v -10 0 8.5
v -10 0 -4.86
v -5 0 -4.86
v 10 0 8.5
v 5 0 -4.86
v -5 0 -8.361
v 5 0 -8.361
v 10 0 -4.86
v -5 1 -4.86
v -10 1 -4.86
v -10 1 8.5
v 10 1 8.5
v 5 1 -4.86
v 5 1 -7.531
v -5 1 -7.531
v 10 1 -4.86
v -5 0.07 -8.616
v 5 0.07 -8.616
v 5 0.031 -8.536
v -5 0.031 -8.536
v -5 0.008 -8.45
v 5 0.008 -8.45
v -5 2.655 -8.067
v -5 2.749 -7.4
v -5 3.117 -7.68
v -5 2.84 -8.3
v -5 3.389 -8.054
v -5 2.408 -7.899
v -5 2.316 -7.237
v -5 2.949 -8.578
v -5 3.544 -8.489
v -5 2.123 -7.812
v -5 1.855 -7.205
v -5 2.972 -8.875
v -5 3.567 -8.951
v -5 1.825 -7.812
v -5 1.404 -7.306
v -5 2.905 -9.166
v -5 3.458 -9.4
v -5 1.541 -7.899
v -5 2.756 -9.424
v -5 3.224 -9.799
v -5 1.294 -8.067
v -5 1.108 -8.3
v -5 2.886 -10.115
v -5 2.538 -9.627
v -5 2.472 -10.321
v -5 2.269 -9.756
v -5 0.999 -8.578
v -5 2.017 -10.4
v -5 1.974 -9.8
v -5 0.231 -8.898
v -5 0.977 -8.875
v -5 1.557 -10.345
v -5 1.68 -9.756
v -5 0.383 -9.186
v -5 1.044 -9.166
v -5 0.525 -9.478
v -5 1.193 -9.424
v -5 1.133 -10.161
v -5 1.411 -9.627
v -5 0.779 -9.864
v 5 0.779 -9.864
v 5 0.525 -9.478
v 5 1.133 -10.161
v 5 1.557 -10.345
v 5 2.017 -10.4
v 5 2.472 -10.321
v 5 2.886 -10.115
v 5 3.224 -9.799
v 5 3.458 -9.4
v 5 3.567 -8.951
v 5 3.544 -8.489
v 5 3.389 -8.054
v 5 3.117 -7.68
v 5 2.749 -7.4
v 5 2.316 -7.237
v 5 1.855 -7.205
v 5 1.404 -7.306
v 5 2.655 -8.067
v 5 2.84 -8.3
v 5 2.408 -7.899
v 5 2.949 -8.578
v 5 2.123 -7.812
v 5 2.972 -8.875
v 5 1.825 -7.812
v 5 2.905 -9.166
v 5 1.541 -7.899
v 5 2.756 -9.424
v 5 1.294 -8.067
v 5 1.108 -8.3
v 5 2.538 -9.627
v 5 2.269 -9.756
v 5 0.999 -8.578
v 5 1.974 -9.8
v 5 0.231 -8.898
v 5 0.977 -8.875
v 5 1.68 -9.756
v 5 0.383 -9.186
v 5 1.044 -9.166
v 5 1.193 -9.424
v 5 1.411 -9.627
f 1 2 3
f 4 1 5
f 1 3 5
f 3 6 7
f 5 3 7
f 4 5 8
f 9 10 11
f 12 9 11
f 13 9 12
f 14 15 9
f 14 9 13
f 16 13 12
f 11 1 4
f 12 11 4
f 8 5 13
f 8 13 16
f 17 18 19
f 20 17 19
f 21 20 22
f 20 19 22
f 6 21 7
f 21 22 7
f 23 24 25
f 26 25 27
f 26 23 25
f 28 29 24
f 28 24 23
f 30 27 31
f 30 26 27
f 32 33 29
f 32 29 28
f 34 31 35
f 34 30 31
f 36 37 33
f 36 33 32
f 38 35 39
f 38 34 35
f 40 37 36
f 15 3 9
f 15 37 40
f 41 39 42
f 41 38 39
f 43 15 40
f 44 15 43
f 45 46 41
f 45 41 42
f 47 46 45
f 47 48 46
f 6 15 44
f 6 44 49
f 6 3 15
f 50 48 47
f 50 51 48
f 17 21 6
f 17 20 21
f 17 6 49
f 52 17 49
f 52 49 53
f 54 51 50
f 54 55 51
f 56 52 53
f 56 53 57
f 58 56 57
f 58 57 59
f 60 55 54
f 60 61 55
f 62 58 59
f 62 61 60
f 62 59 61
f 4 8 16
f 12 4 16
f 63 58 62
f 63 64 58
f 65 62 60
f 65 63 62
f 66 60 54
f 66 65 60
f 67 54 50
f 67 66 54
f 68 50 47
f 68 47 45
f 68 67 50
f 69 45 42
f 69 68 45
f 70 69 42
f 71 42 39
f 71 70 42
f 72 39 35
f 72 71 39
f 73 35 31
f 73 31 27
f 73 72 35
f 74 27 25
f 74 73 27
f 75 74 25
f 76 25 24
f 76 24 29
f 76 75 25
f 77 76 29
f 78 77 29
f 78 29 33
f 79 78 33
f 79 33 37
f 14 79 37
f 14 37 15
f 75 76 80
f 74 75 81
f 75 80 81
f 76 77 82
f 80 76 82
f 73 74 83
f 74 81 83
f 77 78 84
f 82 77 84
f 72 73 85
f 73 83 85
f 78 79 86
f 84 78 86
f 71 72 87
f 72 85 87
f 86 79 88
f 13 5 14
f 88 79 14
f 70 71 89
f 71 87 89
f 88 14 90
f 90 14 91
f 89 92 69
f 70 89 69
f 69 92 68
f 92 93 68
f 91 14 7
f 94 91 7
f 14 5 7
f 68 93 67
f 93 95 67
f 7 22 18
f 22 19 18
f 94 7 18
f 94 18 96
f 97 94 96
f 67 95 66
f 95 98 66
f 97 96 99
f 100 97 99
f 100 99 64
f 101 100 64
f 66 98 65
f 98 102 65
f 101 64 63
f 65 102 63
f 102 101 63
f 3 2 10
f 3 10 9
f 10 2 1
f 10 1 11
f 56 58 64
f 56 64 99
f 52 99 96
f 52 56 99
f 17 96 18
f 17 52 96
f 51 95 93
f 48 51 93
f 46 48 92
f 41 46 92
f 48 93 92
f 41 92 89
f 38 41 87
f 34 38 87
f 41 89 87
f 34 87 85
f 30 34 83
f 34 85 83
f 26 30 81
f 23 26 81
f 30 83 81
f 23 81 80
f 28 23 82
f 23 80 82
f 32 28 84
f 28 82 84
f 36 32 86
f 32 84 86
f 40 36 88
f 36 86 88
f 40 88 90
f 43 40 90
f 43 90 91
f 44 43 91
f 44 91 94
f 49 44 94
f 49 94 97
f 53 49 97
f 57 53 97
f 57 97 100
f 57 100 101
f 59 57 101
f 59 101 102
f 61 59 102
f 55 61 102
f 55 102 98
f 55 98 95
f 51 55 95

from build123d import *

# Parameters (mm, degrees)
SKETCH1_W           = 20
SKETCH1_H           = 17
BOSS_EXTRUDE1_DEPTH = 1
SKETCH2_R           = 1.6
SKETCH2_R_2         = 1
BOSS_EXTRUDE2_DEPTH = 20
FILLET1_R           = 10
FILLET2_R           = 0.5
SKETCH4_W           = 10
SKETCH4_H           = 12
CUT_EXTRUDE3_DEPTH  = 15.86420015


with BuildPart() as part:
    # Sketch1 → Boss-Extrude1 (new body)
    with BuildSketch(Plane(origin=(0, 0, 0), x_dir=(1, 0, 0), z_dir=(0, 1, 0))):
        Rectangle(SKETCH1_W, SKETCH1_H)
    extrude(amount=BOSS_EXTRUDE1_DEPTH)

    # Sketch2 → Boss-Extrude2 (add)
    with BuildSketch(Plane(origin=(10, 0, 0), x_dir=(0, 0, -1), z_dir=(1, 0, 0))):
        with Locations((8.800384095, 1.974416987)):
            Circle(SKETCH2_R)
        with Locations((8.800384095, 1.974416987)):
            Circle(SKETCH2_R_2, mode=Mode.SUBTRACT)
    extrude(amount=-BOSS_EXTRUDE2_DEPTH)

    # Fillet1
    # the kernel refuses this fillet: 10 mm, written as the material it adds along each edge
    with BuildSketch(Plane(origin=(-10, 0.402866989, -8.5), x_dir=(0, -1, 0), z_dir=(1, 0, 0))) as fillet1_piece_1:
        with BuildLine():
            CenterArc((8.937605274, 5.21135706), FILLET1_R, 205.046884286, 6.361578996)
            Line((-0.12201134, 0.977759676), (-0.303203672, 0.893087728))
            ThreePointArc((-0.303203672, 0.893087728), (-0.18232452, 0.473740867), (-0.19644375, 0.037548012))
            Line((-0.19644375, 0.037548012), (0, -0.2))
            ThreePointArc((0, -0.2), (0.201433495, -0.2), (0.232172223, -0.104227141))
            Line((0.232172223, -0.104227141), (0.402866989, 0))
        make_face()
    extrude(amount=20)

    # Fillet2
    fillet2_edges = [part.edges().sort_by_distance(p)[0] for p in [
        (0, 0, -8.5),
    ]]
    fillet(fillet2_edges, radius=FILLET2_R)

    # Sketch4 → Cut-Extrude3 (cut, through all)
    with BuildSketch(Plane(origin=(0, 0, 0), x_dir=(1, 0, 0), z_dir=(0, 1, 0))):
        with Locations((10, 10.859859008)):
            Rectangle(SKETCH4_W, SKETCH4_H)
        with Locations((-10, 10.859859008)):
            Rectangle(SKETCH4_W, SKETCH4_H)
    extrude(amount=CUT_EXTRUDE3_DEPTH, mode=Mode.SUBTRACT)


solid = part.part
